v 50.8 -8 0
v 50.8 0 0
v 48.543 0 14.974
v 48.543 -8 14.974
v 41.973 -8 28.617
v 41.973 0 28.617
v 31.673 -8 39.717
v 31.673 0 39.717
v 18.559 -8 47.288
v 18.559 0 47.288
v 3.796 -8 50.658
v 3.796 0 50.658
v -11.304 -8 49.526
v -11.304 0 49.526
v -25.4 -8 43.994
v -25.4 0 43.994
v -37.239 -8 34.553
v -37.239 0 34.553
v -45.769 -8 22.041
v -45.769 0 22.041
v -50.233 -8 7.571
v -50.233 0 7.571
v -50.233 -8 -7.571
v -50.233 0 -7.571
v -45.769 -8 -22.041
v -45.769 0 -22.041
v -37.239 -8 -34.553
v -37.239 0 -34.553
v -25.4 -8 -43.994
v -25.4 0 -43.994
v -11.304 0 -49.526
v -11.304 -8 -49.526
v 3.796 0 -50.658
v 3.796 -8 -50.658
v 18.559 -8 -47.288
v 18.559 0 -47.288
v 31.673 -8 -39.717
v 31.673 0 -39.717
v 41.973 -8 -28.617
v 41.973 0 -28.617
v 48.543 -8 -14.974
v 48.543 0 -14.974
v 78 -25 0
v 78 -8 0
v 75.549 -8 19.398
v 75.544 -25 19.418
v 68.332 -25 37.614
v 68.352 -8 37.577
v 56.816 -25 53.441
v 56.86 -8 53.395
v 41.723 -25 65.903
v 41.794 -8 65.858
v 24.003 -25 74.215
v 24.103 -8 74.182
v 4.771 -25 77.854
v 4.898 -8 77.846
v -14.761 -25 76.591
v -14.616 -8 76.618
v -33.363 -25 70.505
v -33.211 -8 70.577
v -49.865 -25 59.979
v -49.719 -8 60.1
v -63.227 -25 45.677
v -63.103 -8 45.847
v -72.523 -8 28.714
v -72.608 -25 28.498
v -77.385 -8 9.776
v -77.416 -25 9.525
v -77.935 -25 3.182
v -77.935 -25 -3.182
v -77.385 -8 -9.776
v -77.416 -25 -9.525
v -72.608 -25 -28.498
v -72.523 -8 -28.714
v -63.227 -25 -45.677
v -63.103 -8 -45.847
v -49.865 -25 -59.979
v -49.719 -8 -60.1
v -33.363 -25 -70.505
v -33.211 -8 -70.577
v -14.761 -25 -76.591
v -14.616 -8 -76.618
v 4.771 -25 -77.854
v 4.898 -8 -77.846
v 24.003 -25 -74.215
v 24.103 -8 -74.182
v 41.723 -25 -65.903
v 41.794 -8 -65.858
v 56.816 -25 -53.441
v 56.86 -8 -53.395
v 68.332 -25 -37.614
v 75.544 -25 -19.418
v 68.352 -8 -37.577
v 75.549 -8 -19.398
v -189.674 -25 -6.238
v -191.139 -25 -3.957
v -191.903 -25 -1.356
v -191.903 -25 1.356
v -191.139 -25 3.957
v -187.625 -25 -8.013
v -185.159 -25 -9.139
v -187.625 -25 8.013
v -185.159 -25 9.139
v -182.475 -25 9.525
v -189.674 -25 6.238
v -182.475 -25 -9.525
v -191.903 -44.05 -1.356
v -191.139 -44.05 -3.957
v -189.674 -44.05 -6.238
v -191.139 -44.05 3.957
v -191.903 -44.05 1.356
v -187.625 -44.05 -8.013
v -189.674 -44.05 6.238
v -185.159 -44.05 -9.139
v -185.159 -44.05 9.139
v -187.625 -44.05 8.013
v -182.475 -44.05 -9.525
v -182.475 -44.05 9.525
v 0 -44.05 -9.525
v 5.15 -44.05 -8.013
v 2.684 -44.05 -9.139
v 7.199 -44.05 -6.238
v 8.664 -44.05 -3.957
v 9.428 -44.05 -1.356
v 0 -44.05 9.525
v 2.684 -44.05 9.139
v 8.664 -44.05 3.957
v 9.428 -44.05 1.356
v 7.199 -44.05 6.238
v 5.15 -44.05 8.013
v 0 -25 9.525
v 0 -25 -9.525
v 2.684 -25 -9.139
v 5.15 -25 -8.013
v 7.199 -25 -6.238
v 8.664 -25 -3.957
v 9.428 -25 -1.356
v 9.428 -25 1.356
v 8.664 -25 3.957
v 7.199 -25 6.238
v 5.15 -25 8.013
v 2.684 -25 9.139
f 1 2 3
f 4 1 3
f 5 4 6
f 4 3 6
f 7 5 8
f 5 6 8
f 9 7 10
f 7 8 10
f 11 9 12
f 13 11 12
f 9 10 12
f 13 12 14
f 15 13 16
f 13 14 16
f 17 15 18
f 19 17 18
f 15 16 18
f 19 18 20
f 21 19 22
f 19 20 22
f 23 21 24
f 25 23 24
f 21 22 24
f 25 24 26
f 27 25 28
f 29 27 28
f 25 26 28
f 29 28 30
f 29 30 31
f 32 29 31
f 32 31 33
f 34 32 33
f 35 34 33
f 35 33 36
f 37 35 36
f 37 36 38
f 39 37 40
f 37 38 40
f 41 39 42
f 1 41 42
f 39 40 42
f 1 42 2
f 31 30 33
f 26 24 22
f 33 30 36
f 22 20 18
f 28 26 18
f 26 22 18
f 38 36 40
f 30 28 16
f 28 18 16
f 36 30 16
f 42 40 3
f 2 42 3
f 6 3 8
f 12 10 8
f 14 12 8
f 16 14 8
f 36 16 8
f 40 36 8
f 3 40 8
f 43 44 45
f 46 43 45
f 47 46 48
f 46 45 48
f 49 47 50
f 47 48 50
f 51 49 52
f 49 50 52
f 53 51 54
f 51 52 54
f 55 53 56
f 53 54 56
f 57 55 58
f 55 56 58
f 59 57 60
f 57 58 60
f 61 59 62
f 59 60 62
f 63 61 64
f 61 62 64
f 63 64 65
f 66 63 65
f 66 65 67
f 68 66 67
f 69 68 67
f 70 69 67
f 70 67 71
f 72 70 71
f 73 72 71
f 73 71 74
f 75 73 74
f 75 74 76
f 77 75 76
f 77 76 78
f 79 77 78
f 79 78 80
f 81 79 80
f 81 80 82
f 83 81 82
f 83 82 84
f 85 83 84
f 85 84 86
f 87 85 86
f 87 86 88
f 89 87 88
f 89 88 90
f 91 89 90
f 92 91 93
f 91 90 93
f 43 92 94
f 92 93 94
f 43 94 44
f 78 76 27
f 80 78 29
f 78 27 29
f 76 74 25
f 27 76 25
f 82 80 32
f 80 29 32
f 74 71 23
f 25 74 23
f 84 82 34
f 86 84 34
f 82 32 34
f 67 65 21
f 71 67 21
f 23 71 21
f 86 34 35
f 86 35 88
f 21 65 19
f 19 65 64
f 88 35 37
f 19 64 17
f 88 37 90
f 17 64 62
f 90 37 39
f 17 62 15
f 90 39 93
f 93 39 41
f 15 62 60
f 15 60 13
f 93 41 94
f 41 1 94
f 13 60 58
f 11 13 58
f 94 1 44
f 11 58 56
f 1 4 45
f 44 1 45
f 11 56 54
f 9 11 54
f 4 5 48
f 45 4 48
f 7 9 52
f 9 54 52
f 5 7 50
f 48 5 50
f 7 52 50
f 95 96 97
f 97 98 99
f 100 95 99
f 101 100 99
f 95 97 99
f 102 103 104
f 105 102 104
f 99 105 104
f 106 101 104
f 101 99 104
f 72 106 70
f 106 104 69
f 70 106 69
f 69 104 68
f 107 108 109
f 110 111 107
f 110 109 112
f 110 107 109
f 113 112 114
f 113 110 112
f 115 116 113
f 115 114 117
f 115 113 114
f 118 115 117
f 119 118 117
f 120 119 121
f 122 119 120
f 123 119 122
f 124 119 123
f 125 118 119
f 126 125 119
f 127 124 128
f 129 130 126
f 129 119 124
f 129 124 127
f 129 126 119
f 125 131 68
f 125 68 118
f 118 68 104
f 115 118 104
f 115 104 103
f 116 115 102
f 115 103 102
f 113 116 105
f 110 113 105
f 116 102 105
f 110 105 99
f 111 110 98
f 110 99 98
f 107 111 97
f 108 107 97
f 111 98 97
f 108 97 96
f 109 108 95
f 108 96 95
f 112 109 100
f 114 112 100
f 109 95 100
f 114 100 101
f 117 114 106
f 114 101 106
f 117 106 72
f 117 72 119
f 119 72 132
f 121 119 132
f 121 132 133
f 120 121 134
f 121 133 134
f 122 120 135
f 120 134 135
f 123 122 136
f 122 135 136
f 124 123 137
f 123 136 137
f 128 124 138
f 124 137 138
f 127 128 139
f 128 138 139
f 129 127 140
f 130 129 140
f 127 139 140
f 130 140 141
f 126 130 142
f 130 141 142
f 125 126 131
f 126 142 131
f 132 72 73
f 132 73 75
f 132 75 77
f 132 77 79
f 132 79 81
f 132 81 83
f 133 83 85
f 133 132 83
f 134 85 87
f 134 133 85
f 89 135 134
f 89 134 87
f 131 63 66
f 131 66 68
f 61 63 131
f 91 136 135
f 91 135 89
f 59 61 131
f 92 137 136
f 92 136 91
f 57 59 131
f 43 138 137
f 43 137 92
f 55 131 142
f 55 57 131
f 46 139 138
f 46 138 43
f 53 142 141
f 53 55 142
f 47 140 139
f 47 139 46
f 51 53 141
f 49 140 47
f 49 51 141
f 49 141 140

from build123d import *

# Parameters (mm, degrees)
F0_R     = 50.8
F1_DEPTH = 8
F2_R     = 78
F2_R_2   = 50.8
F3_DEPTH = 17
F5_DEPTH = 19.05


with BuildPart() as f1:
    # F0 (on Front) → F1 (new body)
    with BuildSketch(Plane.XZ):
        Circle(F0_R)
    extrude(amount=F1_DEPTH)

    # F2 (on face) → F3 (join)
    with BuildSketch(Plane.XZ.offset(8)):
        Circle(F2_R)
        Circle(F2_R_2, mode=Mode.SUBTRACT)
        Circle(F2_R_2)
    extrude(amount=F3_DEPTH)

    # F4 (on face) → F5 (join)
    with BuildSketch(Plane.XZ.offset(25)):
        with BuildLine():
            ThreePointArc((-78, 0), (-77.853923, 4.771436), (-77.416241, 9.525))
            Line((-77.416241, 9.525), (-182.475, 9.525))
            ThreePointArc((-182.475, 9.525), (-192, 0), (-182.475, -9.525))
            Line((-182.475, -9.525), (-77.416241, -9.525))
            ThreePointArc((-77.416241, -9.525), (-77.853923, -4.771436), (-78, 0))
        make_face()
        with BuildLine():
            ThreePointArc((0, -9.525), (9.525, 0), (0, 9.525))
            Line((0, 9.525), (-77.416241, 9.525))
            ThreePointArc((-77.416241, 9.525), (-77.853923, 4.771436), (-78, 0))
            ThreePointArc((-78, 0), (-77.853923, -4.771436), (-77.416241, -9.525))
            Line((-77.416241, -9.525), (0, -9.525))
        make_face()
    extrude(amount=F5_DEPTH)


solid = f1.part
